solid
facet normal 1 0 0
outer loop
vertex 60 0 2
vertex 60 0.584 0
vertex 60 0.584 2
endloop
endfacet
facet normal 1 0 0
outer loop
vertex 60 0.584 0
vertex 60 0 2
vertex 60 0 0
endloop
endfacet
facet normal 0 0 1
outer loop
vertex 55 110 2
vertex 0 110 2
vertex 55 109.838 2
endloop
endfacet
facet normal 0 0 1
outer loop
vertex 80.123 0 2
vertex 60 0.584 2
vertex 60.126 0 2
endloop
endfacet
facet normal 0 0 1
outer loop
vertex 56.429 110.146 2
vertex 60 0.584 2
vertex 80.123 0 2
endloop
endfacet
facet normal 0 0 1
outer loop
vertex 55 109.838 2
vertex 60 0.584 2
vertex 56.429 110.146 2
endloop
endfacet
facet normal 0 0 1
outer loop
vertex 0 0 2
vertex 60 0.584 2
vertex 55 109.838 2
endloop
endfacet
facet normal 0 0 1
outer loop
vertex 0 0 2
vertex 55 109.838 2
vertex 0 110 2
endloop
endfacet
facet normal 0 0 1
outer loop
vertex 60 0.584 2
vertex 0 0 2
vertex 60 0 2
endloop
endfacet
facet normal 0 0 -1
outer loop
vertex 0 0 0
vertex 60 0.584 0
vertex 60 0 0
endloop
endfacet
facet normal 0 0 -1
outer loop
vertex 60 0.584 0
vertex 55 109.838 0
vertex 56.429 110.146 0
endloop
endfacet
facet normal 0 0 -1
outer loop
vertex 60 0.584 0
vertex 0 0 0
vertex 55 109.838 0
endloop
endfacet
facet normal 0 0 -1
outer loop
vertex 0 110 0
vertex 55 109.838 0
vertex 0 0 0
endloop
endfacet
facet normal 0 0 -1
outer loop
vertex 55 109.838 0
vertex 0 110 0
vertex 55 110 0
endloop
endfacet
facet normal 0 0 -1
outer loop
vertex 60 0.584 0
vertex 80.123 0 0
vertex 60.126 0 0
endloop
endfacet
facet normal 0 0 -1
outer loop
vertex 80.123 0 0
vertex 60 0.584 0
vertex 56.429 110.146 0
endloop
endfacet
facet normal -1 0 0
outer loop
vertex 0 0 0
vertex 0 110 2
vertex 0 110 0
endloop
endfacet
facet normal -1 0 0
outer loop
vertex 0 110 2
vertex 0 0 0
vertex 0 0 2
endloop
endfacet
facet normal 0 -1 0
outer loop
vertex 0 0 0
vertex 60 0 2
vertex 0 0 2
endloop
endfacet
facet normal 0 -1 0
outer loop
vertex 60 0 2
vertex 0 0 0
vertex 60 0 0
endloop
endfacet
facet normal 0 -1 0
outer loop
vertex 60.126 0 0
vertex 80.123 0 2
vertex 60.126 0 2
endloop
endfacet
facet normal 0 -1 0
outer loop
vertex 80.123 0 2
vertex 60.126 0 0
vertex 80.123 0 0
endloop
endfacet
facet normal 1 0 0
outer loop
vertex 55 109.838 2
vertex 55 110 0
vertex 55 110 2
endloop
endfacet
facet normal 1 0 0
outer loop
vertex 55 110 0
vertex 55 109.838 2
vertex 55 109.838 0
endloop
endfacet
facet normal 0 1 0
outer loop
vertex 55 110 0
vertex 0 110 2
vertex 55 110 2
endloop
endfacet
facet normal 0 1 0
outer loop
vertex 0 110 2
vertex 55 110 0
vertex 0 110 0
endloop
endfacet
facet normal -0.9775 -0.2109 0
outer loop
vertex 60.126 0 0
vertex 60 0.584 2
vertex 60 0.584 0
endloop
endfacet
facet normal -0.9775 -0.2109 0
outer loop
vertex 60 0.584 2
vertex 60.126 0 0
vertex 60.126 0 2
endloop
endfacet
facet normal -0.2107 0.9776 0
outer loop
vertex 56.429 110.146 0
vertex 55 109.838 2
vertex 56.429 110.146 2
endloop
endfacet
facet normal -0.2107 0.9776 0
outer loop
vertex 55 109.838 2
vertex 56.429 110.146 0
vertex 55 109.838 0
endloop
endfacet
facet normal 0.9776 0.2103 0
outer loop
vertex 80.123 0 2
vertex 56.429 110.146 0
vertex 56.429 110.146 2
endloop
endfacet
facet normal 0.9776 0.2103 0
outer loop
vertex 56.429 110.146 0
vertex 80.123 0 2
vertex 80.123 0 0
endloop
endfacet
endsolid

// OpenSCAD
//import("./tmp/files/raspberrypi.stl");

module base_plate(h){
  difference(){
    union(){
      cube([60,93,h]);
      cube([55,110,h]);
      translate([60+20,0,0])
        translate([-19.445,44.485,h/2])rotate([0,0,(90-77.86)])
        //translate([19/2,0,0])
        cube([19.55,95.12+35,h],center=true);
    }//union
    translate([0,-100,0-1/2])cube([100,100,h+1]);
  }//difference
}//module base_plate

base_plate(2);
